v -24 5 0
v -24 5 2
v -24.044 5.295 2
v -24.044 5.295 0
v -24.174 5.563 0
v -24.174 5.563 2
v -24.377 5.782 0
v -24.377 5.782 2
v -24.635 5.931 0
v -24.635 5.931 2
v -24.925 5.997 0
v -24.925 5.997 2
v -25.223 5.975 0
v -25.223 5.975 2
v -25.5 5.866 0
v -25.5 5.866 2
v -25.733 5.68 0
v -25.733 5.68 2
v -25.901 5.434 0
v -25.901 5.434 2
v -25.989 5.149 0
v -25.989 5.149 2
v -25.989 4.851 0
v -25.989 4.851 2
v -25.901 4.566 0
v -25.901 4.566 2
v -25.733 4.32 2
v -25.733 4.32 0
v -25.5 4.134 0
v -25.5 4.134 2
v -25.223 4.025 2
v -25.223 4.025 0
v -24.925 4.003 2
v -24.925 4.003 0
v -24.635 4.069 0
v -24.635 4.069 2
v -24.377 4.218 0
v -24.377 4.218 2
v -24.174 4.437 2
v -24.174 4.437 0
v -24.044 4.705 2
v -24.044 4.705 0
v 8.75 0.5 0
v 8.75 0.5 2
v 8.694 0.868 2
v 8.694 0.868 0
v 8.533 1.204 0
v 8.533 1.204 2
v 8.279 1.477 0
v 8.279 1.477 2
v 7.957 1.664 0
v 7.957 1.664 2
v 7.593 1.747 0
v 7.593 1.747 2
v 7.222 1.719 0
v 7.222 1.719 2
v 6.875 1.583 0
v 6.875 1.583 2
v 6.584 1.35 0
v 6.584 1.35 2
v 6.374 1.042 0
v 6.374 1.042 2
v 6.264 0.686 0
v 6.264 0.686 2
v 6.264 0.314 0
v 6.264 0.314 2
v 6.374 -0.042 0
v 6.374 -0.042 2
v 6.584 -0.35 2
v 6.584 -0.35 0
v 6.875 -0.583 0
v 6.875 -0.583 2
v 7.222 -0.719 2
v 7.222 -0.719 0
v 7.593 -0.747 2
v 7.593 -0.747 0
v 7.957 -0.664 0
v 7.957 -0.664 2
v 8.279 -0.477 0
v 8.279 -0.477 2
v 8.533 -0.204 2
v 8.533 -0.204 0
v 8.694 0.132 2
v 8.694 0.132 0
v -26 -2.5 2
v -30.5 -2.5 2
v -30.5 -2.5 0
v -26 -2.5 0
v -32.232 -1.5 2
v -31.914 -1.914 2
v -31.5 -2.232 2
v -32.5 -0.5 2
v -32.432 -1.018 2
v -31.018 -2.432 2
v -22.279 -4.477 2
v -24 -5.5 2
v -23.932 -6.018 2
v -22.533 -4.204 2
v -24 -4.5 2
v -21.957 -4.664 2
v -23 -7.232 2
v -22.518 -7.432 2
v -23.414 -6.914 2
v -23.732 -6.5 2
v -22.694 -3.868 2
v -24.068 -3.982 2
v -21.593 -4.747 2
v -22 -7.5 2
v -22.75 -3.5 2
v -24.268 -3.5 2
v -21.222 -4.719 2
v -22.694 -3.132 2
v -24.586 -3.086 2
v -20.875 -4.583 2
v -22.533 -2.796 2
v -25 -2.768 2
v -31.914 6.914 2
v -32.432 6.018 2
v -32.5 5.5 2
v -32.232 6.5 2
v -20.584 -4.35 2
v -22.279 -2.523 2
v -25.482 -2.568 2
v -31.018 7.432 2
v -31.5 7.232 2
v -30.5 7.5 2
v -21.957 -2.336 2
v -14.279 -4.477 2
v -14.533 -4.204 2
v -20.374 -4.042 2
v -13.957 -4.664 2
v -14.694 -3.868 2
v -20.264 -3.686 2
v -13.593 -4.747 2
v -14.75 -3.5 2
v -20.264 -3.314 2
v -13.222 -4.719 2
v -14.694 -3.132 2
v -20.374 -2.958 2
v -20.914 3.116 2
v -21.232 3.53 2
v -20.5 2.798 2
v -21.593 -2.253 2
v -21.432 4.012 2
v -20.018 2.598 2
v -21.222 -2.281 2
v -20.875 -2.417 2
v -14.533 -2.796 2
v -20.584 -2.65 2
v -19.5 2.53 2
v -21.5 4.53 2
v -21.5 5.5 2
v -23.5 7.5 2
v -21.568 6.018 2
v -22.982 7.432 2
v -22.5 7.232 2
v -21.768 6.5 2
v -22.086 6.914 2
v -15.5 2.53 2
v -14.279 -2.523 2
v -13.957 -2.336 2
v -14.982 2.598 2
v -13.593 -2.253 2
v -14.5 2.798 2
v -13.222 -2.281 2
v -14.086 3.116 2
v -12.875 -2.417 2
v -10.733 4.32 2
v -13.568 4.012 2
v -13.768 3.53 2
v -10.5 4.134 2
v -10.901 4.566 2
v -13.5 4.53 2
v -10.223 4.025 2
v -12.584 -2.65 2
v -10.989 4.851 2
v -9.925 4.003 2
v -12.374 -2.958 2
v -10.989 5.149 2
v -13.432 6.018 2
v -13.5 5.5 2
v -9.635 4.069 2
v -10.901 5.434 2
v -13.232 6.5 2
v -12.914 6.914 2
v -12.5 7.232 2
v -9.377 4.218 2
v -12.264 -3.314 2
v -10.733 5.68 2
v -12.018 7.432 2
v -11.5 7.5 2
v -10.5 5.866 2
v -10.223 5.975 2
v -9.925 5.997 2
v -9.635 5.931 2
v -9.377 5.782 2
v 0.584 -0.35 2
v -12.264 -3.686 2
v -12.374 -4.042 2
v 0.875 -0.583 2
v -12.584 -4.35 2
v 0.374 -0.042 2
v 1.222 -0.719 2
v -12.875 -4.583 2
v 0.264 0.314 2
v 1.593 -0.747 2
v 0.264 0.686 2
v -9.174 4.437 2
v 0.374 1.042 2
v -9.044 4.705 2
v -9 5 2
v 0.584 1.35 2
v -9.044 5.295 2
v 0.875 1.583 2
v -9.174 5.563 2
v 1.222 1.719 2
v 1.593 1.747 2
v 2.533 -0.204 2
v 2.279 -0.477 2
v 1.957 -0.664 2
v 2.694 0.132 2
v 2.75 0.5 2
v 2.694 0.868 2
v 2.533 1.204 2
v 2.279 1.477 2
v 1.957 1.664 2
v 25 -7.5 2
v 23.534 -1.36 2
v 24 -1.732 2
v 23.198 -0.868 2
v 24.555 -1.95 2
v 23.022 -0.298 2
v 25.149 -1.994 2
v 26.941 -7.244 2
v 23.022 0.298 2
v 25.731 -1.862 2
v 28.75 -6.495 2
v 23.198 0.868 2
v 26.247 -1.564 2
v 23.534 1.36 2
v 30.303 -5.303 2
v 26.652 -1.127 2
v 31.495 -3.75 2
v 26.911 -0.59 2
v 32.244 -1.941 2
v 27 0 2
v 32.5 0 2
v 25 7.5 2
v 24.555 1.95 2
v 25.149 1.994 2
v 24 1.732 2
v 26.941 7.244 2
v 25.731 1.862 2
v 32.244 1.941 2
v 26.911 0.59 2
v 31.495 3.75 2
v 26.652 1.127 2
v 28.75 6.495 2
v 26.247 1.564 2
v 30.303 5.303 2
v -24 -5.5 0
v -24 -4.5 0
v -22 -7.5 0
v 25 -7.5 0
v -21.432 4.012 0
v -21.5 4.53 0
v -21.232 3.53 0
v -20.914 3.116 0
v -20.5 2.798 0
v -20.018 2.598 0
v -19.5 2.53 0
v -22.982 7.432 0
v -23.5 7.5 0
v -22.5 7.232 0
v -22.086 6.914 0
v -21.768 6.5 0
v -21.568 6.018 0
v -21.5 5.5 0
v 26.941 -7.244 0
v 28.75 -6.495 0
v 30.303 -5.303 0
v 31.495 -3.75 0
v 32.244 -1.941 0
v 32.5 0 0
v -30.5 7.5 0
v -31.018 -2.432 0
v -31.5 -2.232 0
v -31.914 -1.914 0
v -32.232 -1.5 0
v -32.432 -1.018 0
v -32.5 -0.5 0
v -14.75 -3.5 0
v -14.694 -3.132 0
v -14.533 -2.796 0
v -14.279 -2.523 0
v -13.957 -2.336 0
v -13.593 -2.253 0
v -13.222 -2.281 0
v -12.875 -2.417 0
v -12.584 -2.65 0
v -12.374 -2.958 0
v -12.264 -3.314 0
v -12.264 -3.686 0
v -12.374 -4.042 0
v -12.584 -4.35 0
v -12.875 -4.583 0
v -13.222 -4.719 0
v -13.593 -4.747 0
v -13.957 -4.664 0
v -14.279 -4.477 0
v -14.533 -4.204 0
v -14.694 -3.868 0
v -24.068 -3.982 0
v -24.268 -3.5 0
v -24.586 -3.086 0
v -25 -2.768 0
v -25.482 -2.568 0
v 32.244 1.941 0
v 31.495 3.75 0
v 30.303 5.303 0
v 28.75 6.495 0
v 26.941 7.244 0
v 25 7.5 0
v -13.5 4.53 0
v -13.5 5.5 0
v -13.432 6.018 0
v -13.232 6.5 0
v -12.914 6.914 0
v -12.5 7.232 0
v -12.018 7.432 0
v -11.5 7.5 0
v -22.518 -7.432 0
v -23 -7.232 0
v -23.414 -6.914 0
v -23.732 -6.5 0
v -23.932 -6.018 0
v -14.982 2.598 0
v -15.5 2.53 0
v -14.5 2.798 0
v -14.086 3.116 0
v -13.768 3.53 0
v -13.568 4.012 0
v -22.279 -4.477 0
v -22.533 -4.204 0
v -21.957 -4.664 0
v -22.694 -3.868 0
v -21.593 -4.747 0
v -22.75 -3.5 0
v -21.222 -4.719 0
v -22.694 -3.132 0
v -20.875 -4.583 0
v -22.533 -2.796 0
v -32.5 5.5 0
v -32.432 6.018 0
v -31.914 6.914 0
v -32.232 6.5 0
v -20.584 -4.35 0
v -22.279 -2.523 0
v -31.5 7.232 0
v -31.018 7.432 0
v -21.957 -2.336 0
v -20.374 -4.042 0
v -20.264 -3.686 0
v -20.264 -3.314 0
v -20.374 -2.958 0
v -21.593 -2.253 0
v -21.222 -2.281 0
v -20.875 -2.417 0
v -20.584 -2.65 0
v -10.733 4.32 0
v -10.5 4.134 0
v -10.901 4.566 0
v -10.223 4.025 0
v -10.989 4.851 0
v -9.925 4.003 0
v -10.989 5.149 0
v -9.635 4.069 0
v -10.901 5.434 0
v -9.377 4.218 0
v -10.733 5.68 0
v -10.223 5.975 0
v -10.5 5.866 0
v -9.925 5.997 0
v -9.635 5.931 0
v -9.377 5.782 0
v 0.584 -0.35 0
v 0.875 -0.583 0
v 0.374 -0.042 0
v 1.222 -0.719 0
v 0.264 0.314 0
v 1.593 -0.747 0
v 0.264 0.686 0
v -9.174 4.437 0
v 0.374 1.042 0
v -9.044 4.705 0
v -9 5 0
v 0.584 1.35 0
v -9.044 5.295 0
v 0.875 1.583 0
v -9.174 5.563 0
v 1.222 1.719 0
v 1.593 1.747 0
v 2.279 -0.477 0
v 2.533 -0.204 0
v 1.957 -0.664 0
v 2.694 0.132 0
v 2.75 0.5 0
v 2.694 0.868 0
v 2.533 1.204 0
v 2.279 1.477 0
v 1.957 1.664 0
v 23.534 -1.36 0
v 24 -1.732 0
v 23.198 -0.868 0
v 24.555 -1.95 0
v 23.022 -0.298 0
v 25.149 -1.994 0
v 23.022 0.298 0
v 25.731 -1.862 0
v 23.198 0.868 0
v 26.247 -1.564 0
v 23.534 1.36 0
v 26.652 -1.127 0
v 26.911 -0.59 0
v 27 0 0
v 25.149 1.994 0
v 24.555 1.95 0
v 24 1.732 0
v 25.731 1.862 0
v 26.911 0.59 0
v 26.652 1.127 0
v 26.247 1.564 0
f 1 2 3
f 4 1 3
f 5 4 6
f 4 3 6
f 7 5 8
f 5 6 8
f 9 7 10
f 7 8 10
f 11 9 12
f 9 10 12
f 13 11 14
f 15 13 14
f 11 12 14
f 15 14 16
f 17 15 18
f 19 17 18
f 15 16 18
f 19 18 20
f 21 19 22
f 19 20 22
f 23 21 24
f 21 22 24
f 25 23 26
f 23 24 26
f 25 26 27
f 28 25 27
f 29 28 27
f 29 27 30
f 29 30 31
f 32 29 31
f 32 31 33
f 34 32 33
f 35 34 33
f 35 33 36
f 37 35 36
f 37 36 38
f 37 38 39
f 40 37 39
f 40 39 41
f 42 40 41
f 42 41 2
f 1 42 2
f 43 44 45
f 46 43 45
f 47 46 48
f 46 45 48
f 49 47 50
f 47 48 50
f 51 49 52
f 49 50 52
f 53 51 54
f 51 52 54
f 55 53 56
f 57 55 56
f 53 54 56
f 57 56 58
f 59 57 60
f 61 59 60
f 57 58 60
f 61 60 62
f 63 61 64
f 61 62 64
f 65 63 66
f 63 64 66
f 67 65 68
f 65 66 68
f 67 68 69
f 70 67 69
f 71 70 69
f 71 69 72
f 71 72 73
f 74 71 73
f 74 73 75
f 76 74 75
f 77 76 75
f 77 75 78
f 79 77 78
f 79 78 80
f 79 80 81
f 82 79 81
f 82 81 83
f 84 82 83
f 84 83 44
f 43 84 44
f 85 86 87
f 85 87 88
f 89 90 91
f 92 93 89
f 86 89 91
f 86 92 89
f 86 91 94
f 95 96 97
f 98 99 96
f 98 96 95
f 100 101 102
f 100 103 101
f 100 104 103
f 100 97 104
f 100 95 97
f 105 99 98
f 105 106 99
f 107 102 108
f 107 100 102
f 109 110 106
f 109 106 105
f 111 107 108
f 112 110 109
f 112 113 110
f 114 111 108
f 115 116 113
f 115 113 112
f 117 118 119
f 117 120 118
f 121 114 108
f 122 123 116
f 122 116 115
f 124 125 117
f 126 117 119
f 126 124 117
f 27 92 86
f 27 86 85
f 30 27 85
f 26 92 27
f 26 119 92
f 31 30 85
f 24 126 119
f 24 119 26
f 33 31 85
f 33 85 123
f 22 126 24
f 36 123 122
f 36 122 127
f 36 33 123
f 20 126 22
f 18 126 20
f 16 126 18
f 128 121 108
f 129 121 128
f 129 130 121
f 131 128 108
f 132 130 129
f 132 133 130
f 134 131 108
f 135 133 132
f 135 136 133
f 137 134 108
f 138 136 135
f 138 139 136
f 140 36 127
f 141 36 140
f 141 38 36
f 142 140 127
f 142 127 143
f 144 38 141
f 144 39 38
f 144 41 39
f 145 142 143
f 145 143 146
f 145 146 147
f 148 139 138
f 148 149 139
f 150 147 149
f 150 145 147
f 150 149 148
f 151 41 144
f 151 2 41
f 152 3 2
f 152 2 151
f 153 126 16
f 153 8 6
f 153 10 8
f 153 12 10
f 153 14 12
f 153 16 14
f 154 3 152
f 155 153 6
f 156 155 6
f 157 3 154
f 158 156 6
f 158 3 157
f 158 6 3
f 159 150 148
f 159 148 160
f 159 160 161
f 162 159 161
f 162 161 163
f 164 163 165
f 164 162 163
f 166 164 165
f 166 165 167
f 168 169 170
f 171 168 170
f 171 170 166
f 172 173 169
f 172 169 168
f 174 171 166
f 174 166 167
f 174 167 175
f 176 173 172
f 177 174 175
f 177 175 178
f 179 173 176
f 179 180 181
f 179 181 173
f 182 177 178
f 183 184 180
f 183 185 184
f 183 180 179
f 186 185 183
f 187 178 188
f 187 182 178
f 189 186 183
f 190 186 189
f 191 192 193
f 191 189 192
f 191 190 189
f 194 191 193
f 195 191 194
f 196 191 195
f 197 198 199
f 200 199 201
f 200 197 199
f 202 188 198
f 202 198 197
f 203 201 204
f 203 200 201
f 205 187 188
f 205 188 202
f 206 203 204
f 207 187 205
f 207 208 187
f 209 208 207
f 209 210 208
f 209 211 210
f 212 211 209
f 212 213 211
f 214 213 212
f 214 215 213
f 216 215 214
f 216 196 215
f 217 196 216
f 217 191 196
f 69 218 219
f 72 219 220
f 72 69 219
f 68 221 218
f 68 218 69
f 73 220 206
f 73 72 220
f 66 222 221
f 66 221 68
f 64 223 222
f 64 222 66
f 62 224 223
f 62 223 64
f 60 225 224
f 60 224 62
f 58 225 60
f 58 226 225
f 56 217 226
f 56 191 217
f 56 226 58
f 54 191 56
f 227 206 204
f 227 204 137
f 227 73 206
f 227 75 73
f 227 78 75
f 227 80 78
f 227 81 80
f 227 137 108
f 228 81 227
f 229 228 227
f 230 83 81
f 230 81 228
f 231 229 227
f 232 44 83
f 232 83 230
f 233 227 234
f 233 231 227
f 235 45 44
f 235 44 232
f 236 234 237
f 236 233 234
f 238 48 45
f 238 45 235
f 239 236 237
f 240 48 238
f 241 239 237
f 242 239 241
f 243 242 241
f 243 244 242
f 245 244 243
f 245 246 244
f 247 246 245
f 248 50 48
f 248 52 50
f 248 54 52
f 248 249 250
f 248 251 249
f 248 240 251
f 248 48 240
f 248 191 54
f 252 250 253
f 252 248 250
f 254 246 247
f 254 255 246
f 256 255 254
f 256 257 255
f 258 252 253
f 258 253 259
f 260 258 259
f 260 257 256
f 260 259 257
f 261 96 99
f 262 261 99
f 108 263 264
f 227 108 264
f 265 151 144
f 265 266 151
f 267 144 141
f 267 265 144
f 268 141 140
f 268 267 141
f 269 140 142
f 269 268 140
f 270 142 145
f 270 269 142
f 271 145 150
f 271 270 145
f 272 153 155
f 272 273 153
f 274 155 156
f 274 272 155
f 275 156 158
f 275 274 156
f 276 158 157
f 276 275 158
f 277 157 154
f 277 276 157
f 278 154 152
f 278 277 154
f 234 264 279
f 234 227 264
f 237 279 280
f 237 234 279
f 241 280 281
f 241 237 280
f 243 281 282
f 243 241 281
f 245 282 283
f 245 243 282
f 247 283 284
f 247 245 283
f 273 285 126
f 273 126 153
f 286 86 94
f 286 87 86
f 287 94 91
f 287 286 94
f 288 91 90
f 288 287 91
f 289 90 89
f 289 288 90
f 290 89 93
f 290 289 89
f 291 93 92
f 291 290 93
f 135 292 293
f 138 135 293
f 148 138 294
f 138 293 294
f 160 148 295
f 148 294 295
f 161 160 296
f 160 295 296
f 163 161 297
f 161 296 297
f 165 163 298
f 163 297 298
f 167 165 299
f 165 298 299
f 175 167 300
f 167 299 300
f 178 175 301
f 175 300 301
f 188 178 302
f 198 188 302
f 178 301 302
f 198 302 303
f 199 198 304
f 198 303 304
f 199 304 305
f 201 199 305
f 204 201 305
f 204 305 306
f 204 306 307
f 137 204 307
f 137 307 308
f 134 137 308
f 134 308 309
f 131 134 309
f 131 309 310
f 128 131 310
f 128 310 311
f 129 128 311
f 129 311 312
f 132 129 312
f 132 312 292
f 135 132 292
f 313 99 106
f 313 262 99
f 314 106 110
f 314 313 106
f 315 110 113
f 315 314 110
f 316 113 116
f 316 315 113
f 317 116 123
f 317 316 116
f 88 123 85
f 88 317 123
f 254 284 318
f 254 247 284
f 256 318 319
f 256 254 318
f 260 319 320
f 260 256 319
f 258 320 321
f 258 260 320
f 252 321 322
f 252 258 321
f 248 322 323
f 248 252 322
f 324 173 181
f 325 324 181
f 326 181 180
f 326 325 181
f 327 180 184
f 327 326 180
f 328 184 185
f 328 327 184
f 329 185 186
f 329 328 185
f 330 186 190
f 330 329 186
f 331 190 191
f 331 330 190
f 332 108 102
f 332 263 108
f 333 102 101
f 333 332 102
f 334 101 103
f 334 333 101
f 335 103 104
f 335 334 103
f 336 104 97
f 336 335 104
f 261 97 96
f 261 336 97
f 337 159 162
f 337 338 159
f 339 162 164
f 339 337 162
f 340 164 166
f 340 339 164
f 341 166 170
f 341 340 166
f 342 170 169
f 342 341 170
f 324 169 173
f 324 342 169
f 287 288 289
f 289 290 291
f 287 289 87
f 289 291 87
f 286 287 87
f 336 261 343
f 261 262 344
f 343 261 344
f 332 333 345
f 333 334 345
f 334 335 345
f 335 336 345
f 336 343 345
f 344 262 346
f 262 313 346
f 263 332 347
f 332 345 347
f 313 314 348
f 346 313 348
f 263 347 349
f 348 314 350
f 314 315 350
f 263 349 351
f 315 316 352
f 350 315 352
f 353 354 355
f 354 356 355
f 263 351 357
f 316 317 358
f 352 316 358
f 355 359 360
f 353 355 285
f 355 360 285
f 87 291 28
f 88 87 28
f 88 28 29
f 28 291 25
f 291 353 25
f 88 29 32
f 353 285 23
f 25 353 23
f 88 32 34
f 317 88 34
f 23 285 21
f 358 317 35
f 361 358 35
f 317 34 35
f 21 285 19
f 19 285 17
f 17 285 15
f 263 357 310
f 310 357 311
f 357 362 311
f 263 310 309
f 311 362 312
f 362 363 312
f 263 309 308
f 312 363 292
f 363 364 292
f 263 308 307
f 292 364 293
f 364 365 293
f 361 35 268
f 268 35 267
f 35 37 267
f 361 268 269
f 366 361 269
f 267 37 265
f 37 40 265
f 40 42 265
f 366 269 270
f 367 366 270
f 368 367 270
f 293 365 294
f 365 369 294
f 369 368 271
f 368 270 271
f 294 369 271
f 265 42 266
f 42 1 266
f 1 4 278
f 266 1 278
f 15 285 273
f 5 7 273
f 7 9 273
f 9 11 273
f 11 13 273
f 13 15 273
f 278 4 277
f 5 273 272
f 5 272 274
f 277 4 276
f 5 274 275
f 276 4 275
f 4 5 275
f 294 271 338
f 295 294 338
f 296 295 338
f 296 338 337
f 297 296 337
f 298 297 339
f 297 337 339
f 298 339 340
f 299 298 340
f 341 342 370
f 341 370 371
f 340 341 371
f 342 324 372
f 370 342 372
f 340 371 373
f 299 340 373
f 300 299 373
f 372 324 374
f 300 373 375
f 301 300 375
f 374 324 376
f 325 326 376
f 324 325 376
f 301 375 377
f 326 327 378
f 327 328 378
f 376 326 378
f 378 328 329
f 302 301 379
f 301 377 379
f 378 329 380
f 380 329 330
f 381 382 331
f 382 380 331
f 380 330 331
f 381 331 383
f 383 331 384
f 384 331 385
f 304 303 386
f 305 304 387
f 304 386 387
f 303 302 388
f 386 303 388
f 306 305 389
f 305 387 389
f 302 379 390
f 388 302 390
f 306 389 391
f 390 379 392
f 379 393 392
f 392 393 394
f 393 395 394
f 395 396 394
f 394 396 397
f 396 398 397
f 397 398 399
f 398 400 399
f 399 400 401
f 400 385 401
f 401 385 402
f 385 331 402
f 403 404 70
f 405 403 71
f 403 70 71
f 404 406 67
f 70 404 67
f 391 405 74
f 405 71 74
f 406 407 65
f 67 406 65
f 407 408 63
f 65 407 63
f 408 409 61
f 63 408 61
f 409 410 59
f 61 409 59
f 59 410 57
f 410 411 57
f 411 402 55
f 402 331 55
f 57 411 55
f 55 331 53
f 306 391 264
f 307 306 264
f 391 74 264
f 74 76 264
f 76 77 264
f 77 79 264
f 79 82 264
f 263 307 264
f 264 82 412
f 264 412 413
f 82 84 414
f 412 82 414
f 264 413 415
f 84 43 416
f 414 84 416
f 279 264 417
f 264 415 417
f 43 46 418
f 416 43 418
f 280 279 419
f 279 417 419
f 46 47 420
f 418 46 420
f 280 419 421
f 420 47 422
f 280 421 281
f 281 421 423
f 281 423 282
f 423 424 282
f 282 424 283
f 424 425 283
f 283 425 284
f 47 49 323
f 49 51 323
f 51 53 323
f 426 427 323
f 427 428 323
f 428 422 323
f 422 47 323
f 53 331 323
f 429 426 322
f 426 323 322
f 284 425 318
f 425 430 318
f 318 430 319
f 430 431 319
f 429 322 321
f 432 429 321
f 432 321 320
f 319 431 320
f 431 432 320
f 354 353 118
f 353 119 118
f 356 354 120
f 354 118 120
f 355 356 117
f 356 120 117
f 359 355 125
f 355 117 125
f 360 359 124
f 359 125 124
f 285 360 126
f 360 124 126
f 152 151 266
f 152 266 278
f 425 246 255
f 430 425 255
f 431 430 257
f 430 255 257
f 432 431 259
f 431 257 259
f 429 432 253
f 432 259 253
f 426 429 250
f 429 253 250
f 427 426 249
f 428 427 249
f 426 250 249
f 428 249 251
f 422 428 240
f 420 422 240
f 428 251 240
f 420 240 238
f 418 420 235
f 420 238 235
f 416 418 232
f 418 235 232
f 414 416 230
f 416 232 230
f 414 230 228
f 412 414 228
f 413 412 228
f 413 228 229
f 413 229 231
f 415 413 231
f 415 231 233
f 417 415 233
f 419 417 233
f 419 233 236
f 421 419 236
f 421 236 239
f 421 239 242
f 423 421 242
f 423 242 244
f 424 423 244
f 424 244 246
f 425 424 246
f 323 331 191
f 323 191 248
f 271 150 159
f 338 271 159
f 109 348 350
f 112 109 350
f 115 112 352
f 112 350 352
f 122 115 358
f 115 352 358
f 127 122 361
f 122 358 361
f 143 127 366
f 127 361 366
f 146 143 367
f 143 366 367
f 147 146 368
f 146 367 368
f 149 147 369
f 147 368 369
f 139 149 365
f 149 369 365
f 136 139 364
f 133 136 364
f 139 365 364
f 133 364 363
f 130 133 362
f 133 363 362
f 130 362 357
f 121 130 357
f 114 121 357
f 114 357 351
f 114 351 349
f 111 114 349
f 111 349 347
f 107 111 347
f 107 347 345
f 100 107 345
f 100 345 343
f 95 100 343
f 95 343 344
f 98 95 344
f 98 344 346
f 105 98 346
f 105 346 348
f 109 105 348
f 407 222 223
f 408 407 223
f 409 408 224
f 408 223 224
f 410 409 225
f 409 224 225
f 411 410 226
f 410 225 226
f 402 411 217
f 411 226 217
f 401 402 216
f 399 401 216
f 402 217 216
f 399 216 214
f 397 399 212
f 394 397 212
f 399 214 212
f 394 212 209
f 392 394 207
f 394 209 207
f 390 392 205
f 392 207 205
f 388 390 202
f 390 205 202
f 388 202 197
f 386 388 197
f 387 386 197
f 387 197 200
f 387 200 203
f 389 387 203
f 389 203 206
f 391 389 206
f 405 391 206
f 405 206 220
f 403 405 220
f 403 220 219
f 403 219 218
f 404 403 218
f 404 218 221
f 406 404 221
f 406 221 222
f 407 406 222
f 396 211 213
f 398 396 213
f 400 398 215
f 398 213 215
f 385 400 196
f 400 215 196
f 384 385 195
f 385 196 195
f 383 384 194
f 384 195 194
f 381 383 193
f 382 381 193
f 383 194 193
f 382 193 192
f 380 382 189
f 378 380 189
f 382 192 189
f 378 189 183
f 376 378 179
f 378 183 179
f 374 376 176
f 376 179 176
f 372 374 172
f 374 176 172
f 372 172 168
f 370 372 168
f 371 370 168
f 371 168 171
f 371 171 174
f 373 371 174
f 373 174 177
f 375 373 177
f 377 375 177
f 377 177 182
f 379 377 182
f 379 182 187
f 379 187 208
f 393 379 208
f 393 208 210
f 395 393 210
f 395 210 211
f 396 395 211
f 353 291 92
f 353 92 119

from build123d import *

# Parameters (mm, degrees)
SKETCH_1_W          = 65
SKETCH_1_H          = 15
EXTRUDE_1_DEPTH     = 2
FILLET_1_R          = 7.5
SKETCH_2_R          = 2
SKETCH_2_R_2        = 1
CUT_EXTRUDE_1_DEPTH = 10
SKETCH_4_R          = 1.25
CUT_EXTRUDE_3_DEPTH = 10
SKETCH_8_R          = 1.25
CUT_EXTRUDE_6_DEPTH = 10
SKETCH_9_W          = 8
SKETCH_9_H          = 4.970258762
CUT_EXTRUDE_7_DEPTH = 10
SKETCH_10_W         = 8.5
SKETCH_10_H         = 5
CUT_EXTRUDE_8_DEPTH = 2
FILLET_3_R          = 2


with BuildPart() as part:
    # 草图1 → 凸台-拉伸1 (new body)
    with BuildSketch(Plane.XY):
        Rectangle(SKETCH_1_W, SKETCH_1_H)
    extrude(amount=EXTRUDE_1_DEPTH)

    # 圆角1
    fillet_1_edges = [part.edges().sort_by_distance(p)[0] for p in [
        (32.5, 7.5, 1),
        (32.5, -7.5, 1),
    ]]
    fillet(fillet_1_edges, radius=FILLET_1_R - 0.0001)  # a hair under: the kernel refuses the full size

    # 草图2 → 切除-拉伸1 (cut)
    with BuildSketch(Plane.XY.offset(2)):
        with Locations((25, 0)):
            Circle(SKETCH_2_R)
        with Locations((-25, 5)):
            Circle(SKETCH_2_R_2)
        with Locations((-10, 5)):
            Circle(SKETCH_2_R_2)
    extrude(amount=-CUT_EXTRUDE_1_DEPTH, mode=Mode.SUBTRACT)

    # 草图4 → 切除-拉伸3 (cut)
    with BuildSketch(Plane(origin=(0, 0, 0), x_dir=(-1, 0, 0), z_dir=(0, 0, -1))):
        with Locations((21.5, -3.5)):
            Circle(SKETCH_4_R)
        with Locations((13.5, -3.5)):
            Circle(SKETCH_4_R)
    extrude(amount=-CUT_EXTRUDE_3_DEPTH, mode=Mode.SUBTRACT)

    # 草图8 → 切除-拉伸6 (cut)
    with BuildSketch(Plane.XY.offset(2)):
        with Locations((7.5, 0.5)):
            Circle(SKETCH_8_R)
        with Locations((1.5, 0.5)):
            Circle(SKETCH_8_R)
    extrude(amount=-CUT_EXTRUDE_6_DEPTH, mode=Mode.SUBTRACT)

    # 草图9 → 切除-拉伸7 (cut)
    with BuildSketch(Plane.XY.offset(2)):
        with Locations((-17.5, 5.014870619)):
            Rectangle(SKETCH_9_W, SKETCH_9_H)
    extrude(amount=-CUT_EXTRUDE_7_DEPTH, mode=Mode.SUBTRACT)

    # 草图10 → 切除-拉伸8 (cut)
    with BuildSketch(Plane.XY.offset(2)):
        with Locations((-28.25, -5)):
            Rectangle(SKETCH_10_W, SKETCH_10_H)
    extrude(amount=-CUT_EXTRUDE_8_DEPTH, mode=Mode.SUBTRACT)

    # 圆角3
    fillet_3_edges = [part.edges().sort_by_distance(p)[0] for p in [
        (-21.5, 2.529741238, 1),
        (-21.5, 7.5, 1),
        (-13.5, 7.5, 1),
        (-13.5, 2.529741238, 1),
        (-32.5, 7.5, 1),
        (-32.5, -2.5, 1),
        (-24, -2.5, 1),
        (-24, -7.5, 1),
    ]]
    fillet(fillet_3_edges, radius=FILLET_3_R)


solid = part.part
